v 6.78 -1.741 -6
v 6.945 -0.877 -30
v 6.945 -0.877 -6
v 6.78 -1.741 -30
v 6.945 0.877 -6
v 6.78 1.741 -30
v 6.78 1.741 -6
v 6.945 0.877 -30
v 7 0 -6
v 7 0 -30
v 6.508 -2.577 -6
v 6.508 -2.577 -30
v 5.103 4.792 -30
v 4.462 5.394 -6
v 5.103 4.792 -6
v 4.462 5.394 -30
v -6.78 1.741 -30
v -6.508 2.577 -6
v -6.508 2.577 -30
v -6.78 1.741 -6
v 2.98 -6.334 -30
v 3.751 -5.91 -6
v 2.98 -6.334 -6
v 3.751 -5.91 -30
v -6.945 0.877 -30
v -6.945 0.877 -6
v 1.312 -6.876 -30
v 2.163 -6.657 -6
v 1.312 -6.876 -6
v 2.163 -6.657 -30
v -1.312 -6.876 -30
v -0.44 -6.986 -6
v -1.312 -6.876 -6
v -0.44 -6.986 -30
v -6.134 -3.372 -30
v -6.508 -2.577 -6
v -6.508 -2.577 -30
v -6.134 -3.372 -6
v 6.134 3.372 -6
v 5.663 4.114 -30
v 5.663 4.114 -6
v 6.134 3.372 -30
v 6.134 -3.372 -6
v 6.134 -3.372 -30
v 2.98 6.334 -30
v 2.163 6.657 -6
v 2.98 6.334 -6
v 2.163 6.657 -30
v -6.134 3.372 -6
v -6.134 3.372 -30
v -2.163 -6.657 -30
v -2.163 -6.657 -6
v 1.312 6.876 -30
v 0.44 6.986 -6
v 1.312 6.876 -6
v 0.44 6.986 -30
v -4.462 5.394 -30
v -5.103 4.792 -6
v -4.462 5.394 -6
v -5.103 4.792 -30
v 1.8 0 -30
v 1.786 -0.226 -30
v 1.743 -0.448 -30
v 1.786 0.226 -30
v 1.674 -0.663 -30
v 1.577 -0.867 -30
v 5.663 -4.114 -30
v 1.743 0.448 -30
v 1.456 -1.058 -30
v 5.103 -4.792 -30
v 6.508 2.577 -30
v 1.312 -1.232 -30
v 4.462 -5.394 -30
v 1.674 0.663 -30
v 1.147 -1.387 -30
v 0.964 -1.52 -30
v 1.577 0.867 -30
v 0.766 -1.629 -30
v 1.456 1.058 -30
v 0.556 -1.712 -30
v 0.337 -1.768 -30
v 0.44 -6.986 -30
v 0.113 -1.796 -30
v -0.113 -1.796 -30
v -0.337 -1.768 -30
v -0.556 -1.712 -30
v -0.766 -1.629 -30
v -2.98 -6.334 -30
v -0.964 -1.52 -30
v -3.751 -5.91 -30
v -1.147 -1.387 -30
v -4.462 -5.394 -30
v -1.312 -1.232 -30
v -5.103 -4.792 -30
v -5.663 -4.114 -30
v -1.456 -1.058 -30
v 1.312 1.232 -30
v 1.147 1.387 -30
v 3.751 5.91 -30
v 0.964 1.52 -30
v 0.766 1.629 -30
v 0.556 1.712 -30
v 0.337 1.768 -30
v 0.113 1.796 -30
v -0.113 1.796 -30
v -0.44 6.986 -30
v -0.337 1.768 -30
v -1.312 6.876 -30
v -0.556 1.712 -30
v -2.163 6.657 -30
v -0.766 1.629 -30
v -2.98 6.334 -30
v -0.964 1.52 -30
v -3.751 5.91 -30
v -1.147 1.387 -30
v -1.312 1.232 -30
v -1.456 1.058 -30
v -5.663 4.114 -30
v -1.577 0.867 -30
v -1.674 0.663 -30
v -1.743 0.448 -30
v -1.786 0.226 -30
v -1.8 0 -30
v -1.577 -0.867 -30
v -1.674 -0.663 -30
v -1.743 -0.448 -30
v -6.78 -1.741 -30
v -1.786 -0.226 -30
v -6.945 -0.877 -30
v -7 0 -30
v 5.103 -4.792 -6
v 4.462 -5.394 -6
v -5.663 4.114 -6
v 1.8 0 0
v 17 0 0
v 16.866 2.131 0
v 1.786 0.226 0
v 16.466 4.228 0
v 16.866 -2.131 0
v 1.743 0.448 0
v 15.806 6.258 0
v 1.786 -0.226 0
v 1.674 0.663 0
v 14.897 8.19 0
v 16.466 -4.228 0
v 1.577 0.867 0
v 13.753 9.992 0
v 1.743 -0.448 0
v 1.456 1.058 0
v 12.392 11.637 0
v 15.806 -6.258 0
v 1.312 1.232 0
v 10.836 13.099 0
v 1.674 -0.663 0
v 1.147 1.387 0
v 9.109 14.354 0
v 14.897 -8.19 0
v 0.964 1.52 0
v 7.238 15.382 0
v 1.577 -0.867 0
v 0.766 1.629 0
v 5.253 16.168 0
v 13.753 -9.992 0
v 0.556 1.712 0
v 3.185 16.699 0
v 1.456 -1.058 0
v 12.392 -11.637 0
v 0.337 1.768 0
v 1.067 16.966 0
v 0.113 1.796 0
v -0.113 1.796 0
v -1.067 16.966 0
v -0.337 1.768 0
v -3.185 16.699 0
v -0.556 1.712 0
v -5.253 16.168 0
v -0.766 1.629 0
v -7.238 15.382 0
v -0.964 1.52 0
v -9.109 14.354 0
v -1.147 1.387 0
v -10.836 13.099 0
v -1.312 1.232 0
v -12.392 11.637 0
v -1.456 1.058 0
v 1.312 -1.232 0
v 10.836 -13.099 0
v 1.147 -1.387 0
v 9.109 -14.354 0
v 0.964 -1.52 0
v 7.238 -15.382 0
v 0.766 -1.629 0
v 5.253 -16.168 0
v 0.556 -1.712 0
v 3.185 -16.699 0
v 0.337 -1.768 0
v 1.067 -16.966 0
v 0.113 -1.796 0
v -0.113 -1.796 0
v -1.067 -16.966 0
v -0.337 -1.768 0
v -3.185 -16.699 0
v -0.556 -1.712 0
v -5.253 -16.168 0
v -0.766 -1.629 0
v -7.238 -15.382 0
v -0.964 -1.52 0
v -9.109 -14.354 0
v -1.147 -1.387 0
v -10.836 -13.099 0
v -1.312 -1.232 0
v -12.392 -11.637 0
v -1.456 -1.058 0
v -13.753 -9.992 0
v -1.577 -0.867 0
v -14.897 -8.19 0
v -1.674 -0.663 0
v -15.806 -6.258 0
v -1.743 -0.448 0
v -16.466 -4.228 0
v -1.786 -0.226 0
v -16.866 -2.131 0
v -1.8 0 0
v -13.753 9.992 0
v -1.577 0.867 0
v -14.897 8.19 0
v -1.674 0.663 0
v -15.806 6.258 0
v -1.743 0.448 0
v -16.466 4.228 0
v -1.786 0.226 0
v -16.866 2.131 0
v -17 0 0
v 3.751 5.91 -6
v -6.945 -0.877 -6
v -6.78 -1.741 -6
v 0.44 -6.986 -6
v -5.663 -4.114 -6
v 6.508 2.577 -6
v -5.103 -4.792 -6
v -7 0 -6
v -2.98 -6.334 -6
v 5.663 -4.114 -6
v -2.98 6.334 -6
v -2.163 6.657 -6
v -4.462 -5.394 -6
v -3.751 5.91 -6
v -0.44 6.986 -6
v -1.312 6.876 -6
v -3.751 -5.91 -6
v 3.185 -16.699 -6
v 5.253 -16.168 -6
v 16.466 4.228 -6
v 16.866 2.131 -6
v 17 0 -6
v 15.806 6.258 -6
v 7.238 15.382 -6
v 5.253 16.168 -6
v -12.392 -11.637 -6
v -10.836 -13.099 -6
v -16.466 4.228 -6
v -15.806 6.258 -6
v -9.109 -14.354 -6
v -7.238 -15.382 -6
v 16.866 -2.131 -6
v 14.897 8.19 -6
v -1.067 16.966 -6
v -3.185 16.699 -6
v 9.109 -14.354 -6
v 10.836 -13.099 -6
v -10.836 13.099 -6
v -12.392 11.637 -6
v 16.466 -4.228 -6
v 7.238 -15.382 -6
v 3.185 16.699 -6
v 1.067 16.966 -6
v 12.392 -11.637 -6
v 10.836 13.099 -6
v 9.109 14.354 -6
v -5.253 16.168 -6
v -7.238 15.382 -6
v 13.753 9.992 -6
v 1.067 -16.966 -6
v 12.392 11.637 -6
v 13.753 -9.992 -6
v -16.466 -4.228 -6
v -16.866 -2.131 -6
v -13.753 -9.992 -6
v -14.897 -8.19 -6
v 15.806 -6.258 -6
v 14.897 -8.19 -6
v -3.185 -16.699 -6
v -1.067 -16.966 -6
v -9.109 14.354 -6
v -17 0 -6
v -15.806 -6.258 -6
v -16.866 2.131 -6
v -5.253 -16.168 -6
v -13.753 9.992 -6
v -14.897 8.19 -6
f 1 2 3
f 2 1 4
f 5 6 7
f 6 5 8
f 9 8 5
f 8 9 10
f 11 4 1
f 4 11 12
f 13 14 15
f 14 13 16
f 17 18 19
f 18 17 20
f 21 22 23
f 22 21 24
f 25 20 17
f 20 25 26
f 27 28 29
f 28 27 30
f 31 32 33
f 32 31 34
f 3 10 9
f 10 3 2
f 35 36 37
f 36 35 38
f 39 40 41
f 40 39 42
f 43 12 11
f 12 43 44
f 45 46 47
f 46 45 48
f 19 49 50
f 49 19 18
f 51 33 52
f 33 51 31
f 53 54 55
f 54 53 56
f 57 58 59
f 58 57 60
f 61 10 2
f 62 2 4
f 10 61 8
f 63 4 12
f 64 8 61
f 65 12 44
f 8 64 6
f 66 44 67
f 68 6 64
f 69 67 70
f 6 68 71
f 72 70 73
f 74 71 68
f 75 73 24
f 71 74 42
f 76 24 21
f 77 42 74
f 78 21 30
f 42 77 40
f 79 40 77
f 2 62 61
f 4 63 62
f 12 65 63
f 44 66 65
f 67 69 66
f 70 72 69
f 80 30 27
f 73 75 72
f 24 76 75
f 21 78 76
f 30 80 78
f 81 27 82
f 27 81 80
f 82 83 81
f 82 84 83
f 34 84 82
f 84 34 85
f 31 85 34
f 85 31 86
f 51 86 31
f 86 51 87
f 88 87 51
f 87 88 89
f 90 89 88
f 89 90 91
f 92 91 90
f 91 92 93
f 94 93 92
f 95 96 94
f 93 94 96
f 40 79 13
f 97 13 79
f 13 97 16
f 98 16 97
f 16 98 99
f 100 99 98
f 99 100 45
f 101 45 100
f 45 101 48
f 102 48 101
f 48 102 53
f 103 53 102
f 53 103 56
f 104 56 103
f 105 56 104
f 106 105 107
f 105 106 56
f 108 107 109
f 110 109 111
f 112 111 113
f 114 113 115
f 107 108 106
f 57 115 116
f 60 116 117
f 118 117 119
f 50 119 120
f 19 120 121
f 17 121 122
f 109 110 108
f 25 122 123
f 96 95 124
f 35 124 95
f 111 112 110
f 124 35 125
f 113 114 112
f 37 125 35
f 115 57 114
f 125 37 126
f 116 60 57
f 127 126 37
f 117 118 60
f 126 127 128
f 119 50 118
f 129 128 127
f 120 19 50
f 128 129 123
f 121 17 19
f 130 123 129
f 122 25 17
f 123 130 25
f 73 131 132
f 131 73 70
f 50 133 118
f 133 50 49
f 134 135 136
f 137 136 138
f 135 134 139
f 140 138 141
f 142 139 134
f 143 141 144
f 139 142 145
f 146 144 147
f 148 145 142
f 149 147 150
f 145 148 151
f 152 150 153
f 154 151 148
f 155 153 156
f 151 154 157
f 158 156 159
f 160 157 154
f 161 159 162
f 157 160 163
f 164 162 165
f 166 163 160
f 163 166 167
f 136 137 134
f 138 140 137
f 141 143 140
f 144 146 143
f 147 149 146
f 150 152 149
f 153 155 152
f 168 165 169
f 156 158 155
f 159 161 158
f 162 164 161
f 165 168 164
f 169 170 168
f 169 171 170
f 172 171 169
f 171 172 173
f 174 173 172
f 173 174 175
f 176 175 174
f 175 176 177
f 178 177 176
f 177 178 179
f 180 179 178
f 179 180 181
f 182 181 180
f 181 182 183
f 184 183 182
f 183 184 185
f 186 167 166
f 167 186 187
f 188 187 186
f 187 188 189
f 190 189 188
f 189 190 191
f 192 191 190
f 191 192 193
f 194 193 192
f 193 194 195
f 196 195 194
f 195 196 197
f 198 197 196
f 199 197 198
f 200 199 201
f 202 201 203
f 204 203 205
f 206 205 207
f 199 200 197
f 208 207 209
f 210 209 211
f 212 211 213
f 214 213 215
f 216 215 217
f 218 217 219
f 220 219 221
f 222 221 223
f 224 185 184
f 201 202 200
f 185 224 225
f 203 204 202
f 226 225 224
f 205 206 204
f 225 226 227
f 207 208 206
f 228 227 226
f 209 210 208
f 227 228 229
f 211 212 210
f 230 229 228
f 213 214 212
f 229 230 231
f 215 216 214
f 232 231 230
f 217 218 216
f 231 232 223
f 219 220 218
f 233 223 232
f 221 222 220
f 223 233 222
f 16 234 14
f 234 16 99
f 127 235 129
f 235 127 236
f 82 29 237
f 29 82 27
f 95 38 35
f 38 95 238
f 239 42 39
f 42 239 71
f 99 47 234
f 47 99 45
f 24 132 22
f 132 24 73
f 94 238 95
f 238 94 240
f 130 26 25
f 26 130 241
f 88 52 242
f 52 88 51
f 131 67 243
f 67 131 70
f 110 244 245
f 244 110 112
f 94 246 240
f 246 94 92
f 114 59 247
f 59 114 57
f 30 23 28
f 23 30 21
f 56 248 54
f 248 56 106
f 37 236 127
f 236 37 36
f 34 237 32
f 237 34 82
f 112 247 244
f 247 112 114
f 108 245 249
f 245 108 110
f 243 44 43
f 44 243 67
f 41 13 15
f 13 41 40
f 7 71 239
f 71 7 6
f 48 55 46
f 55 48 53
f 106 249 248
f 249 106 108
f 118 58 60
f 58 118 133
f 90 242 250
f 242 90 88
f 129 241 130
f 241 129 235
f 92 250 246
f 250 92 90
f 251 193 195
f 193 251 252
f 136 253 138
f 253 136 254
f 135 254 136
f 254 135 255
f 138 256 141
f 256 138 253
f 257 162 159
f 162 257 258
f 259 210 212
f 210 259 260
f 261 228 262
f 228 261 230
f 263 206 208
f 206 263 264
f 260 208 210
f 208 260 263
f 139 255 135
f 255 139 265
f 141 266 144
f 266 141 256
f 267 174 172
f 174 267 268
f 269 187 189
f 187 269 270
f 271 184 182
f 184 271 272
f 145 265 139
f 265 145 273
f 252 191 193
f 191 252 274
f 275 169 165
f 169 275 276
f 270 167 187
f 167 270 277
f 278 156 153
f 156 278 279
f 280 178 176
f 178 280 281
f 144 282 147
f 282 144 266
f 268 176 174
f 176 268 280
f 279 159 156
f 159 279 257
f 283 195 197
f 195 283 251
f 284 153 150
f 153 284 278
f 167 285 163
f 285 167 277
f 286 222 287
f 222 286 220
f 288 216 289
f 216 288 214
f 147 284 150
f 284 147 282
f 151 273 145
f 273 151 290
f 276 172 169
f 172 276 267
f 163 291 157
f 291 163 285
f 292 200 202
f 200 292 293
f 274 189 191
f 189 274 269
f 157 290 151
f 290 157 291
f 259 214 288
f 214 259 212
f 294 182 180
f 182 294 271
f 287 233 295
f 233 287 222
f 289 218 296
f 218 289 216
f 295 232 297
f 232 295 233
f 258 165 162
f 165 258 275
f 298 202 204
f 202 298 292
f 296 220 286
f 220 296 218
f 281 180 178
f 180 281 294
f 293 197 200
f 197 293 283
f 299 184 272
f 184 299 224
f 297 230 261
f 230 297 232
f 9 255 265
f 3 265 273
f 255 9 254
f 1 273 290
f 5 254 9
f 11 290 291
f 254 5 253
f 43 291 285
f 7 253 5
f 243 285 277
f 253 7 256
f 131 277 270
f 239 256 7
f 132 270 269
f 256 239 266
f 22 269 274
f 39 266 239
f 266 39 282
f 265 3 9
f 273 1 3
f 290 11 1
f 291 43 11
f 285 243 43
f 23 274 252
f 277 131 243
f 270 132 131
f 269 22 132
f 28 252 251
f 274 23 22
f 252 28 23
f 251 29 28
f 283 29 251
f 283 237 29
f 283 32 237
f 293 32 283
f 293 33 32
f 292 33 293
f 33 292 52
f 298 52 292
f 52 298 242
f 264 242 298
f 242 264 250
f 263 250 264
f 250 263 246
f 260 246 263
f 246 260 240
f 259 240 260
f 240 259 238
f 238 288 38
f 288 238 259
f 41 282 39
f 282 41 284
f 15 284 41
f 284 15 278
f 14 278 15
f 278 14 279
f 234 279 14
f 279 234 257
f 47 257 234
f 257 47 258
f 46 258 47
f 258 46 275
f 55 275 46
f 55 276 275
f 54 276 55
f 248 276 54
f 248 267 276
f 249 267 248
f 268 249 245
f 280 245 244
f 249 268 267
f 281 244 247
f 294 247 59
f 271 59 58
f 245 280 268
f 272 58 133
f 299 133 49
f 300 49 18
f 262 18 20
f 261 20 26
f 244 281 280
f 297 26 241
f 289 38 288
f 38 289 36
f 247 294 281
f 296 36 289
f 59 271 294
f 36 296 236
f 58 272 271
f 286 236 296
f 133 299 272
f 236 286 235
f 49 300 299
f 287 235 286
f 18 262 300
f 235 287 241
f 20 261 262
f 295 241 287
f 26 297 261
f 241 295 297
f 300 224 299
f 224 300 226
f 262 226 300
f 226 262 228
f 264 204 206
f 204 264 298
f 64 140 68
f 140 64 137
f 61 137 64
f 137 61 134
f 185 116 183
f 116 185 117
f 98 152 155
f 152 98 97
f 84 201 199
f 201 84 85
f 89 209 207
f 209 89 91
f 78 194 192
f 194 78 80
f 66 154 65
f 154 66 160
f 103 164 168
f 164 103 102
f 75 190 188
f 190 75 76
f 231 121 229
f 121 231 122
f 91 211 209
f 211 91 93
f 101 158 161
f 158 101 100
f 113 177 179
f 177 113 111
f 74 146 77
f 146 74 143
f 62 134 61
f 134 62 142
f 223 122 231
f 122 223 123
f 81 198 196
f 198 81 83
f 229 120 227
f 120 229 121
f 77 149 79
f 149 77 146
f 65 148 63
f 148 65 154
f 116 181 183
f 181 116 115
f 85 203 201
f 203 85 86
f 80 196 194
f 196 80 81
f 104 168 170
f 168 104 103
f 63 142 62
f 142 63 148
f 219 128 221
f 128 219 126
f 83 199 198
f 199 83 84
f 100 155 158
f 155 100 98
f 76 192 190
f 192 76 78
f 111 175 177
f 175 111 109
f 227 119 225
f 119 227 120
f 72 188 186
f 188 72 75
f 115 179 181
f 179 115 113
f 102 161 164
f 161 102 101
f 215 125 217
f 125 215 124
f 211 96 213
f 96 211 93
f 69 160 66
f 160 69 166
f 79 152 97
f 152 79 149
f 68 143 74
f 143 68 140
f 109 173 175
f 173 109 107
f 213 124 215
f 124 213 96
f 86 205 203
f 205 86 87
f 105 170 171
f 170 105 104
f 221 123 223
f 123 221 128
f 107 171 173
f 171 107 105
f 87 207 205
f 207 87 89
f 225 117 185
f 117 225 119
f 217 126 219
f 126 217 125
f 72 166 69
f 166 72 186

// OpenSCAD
$fn = 50;


difference() {
	union() {
		translate(v = [0, 0, -30.0000000000]) {
			cylinder(h = 30, r = 7.0000000000);
		}
		translate(v = [0, 0, -6.0000000000]) {
			cylinder(h = 6, r = 17.0000000000);
		}
	}
	union() {
		#translate(v = [0, 0, -30]) {
			cylinder(h = 30, r = 1.8000000000);
		}
	}
}
